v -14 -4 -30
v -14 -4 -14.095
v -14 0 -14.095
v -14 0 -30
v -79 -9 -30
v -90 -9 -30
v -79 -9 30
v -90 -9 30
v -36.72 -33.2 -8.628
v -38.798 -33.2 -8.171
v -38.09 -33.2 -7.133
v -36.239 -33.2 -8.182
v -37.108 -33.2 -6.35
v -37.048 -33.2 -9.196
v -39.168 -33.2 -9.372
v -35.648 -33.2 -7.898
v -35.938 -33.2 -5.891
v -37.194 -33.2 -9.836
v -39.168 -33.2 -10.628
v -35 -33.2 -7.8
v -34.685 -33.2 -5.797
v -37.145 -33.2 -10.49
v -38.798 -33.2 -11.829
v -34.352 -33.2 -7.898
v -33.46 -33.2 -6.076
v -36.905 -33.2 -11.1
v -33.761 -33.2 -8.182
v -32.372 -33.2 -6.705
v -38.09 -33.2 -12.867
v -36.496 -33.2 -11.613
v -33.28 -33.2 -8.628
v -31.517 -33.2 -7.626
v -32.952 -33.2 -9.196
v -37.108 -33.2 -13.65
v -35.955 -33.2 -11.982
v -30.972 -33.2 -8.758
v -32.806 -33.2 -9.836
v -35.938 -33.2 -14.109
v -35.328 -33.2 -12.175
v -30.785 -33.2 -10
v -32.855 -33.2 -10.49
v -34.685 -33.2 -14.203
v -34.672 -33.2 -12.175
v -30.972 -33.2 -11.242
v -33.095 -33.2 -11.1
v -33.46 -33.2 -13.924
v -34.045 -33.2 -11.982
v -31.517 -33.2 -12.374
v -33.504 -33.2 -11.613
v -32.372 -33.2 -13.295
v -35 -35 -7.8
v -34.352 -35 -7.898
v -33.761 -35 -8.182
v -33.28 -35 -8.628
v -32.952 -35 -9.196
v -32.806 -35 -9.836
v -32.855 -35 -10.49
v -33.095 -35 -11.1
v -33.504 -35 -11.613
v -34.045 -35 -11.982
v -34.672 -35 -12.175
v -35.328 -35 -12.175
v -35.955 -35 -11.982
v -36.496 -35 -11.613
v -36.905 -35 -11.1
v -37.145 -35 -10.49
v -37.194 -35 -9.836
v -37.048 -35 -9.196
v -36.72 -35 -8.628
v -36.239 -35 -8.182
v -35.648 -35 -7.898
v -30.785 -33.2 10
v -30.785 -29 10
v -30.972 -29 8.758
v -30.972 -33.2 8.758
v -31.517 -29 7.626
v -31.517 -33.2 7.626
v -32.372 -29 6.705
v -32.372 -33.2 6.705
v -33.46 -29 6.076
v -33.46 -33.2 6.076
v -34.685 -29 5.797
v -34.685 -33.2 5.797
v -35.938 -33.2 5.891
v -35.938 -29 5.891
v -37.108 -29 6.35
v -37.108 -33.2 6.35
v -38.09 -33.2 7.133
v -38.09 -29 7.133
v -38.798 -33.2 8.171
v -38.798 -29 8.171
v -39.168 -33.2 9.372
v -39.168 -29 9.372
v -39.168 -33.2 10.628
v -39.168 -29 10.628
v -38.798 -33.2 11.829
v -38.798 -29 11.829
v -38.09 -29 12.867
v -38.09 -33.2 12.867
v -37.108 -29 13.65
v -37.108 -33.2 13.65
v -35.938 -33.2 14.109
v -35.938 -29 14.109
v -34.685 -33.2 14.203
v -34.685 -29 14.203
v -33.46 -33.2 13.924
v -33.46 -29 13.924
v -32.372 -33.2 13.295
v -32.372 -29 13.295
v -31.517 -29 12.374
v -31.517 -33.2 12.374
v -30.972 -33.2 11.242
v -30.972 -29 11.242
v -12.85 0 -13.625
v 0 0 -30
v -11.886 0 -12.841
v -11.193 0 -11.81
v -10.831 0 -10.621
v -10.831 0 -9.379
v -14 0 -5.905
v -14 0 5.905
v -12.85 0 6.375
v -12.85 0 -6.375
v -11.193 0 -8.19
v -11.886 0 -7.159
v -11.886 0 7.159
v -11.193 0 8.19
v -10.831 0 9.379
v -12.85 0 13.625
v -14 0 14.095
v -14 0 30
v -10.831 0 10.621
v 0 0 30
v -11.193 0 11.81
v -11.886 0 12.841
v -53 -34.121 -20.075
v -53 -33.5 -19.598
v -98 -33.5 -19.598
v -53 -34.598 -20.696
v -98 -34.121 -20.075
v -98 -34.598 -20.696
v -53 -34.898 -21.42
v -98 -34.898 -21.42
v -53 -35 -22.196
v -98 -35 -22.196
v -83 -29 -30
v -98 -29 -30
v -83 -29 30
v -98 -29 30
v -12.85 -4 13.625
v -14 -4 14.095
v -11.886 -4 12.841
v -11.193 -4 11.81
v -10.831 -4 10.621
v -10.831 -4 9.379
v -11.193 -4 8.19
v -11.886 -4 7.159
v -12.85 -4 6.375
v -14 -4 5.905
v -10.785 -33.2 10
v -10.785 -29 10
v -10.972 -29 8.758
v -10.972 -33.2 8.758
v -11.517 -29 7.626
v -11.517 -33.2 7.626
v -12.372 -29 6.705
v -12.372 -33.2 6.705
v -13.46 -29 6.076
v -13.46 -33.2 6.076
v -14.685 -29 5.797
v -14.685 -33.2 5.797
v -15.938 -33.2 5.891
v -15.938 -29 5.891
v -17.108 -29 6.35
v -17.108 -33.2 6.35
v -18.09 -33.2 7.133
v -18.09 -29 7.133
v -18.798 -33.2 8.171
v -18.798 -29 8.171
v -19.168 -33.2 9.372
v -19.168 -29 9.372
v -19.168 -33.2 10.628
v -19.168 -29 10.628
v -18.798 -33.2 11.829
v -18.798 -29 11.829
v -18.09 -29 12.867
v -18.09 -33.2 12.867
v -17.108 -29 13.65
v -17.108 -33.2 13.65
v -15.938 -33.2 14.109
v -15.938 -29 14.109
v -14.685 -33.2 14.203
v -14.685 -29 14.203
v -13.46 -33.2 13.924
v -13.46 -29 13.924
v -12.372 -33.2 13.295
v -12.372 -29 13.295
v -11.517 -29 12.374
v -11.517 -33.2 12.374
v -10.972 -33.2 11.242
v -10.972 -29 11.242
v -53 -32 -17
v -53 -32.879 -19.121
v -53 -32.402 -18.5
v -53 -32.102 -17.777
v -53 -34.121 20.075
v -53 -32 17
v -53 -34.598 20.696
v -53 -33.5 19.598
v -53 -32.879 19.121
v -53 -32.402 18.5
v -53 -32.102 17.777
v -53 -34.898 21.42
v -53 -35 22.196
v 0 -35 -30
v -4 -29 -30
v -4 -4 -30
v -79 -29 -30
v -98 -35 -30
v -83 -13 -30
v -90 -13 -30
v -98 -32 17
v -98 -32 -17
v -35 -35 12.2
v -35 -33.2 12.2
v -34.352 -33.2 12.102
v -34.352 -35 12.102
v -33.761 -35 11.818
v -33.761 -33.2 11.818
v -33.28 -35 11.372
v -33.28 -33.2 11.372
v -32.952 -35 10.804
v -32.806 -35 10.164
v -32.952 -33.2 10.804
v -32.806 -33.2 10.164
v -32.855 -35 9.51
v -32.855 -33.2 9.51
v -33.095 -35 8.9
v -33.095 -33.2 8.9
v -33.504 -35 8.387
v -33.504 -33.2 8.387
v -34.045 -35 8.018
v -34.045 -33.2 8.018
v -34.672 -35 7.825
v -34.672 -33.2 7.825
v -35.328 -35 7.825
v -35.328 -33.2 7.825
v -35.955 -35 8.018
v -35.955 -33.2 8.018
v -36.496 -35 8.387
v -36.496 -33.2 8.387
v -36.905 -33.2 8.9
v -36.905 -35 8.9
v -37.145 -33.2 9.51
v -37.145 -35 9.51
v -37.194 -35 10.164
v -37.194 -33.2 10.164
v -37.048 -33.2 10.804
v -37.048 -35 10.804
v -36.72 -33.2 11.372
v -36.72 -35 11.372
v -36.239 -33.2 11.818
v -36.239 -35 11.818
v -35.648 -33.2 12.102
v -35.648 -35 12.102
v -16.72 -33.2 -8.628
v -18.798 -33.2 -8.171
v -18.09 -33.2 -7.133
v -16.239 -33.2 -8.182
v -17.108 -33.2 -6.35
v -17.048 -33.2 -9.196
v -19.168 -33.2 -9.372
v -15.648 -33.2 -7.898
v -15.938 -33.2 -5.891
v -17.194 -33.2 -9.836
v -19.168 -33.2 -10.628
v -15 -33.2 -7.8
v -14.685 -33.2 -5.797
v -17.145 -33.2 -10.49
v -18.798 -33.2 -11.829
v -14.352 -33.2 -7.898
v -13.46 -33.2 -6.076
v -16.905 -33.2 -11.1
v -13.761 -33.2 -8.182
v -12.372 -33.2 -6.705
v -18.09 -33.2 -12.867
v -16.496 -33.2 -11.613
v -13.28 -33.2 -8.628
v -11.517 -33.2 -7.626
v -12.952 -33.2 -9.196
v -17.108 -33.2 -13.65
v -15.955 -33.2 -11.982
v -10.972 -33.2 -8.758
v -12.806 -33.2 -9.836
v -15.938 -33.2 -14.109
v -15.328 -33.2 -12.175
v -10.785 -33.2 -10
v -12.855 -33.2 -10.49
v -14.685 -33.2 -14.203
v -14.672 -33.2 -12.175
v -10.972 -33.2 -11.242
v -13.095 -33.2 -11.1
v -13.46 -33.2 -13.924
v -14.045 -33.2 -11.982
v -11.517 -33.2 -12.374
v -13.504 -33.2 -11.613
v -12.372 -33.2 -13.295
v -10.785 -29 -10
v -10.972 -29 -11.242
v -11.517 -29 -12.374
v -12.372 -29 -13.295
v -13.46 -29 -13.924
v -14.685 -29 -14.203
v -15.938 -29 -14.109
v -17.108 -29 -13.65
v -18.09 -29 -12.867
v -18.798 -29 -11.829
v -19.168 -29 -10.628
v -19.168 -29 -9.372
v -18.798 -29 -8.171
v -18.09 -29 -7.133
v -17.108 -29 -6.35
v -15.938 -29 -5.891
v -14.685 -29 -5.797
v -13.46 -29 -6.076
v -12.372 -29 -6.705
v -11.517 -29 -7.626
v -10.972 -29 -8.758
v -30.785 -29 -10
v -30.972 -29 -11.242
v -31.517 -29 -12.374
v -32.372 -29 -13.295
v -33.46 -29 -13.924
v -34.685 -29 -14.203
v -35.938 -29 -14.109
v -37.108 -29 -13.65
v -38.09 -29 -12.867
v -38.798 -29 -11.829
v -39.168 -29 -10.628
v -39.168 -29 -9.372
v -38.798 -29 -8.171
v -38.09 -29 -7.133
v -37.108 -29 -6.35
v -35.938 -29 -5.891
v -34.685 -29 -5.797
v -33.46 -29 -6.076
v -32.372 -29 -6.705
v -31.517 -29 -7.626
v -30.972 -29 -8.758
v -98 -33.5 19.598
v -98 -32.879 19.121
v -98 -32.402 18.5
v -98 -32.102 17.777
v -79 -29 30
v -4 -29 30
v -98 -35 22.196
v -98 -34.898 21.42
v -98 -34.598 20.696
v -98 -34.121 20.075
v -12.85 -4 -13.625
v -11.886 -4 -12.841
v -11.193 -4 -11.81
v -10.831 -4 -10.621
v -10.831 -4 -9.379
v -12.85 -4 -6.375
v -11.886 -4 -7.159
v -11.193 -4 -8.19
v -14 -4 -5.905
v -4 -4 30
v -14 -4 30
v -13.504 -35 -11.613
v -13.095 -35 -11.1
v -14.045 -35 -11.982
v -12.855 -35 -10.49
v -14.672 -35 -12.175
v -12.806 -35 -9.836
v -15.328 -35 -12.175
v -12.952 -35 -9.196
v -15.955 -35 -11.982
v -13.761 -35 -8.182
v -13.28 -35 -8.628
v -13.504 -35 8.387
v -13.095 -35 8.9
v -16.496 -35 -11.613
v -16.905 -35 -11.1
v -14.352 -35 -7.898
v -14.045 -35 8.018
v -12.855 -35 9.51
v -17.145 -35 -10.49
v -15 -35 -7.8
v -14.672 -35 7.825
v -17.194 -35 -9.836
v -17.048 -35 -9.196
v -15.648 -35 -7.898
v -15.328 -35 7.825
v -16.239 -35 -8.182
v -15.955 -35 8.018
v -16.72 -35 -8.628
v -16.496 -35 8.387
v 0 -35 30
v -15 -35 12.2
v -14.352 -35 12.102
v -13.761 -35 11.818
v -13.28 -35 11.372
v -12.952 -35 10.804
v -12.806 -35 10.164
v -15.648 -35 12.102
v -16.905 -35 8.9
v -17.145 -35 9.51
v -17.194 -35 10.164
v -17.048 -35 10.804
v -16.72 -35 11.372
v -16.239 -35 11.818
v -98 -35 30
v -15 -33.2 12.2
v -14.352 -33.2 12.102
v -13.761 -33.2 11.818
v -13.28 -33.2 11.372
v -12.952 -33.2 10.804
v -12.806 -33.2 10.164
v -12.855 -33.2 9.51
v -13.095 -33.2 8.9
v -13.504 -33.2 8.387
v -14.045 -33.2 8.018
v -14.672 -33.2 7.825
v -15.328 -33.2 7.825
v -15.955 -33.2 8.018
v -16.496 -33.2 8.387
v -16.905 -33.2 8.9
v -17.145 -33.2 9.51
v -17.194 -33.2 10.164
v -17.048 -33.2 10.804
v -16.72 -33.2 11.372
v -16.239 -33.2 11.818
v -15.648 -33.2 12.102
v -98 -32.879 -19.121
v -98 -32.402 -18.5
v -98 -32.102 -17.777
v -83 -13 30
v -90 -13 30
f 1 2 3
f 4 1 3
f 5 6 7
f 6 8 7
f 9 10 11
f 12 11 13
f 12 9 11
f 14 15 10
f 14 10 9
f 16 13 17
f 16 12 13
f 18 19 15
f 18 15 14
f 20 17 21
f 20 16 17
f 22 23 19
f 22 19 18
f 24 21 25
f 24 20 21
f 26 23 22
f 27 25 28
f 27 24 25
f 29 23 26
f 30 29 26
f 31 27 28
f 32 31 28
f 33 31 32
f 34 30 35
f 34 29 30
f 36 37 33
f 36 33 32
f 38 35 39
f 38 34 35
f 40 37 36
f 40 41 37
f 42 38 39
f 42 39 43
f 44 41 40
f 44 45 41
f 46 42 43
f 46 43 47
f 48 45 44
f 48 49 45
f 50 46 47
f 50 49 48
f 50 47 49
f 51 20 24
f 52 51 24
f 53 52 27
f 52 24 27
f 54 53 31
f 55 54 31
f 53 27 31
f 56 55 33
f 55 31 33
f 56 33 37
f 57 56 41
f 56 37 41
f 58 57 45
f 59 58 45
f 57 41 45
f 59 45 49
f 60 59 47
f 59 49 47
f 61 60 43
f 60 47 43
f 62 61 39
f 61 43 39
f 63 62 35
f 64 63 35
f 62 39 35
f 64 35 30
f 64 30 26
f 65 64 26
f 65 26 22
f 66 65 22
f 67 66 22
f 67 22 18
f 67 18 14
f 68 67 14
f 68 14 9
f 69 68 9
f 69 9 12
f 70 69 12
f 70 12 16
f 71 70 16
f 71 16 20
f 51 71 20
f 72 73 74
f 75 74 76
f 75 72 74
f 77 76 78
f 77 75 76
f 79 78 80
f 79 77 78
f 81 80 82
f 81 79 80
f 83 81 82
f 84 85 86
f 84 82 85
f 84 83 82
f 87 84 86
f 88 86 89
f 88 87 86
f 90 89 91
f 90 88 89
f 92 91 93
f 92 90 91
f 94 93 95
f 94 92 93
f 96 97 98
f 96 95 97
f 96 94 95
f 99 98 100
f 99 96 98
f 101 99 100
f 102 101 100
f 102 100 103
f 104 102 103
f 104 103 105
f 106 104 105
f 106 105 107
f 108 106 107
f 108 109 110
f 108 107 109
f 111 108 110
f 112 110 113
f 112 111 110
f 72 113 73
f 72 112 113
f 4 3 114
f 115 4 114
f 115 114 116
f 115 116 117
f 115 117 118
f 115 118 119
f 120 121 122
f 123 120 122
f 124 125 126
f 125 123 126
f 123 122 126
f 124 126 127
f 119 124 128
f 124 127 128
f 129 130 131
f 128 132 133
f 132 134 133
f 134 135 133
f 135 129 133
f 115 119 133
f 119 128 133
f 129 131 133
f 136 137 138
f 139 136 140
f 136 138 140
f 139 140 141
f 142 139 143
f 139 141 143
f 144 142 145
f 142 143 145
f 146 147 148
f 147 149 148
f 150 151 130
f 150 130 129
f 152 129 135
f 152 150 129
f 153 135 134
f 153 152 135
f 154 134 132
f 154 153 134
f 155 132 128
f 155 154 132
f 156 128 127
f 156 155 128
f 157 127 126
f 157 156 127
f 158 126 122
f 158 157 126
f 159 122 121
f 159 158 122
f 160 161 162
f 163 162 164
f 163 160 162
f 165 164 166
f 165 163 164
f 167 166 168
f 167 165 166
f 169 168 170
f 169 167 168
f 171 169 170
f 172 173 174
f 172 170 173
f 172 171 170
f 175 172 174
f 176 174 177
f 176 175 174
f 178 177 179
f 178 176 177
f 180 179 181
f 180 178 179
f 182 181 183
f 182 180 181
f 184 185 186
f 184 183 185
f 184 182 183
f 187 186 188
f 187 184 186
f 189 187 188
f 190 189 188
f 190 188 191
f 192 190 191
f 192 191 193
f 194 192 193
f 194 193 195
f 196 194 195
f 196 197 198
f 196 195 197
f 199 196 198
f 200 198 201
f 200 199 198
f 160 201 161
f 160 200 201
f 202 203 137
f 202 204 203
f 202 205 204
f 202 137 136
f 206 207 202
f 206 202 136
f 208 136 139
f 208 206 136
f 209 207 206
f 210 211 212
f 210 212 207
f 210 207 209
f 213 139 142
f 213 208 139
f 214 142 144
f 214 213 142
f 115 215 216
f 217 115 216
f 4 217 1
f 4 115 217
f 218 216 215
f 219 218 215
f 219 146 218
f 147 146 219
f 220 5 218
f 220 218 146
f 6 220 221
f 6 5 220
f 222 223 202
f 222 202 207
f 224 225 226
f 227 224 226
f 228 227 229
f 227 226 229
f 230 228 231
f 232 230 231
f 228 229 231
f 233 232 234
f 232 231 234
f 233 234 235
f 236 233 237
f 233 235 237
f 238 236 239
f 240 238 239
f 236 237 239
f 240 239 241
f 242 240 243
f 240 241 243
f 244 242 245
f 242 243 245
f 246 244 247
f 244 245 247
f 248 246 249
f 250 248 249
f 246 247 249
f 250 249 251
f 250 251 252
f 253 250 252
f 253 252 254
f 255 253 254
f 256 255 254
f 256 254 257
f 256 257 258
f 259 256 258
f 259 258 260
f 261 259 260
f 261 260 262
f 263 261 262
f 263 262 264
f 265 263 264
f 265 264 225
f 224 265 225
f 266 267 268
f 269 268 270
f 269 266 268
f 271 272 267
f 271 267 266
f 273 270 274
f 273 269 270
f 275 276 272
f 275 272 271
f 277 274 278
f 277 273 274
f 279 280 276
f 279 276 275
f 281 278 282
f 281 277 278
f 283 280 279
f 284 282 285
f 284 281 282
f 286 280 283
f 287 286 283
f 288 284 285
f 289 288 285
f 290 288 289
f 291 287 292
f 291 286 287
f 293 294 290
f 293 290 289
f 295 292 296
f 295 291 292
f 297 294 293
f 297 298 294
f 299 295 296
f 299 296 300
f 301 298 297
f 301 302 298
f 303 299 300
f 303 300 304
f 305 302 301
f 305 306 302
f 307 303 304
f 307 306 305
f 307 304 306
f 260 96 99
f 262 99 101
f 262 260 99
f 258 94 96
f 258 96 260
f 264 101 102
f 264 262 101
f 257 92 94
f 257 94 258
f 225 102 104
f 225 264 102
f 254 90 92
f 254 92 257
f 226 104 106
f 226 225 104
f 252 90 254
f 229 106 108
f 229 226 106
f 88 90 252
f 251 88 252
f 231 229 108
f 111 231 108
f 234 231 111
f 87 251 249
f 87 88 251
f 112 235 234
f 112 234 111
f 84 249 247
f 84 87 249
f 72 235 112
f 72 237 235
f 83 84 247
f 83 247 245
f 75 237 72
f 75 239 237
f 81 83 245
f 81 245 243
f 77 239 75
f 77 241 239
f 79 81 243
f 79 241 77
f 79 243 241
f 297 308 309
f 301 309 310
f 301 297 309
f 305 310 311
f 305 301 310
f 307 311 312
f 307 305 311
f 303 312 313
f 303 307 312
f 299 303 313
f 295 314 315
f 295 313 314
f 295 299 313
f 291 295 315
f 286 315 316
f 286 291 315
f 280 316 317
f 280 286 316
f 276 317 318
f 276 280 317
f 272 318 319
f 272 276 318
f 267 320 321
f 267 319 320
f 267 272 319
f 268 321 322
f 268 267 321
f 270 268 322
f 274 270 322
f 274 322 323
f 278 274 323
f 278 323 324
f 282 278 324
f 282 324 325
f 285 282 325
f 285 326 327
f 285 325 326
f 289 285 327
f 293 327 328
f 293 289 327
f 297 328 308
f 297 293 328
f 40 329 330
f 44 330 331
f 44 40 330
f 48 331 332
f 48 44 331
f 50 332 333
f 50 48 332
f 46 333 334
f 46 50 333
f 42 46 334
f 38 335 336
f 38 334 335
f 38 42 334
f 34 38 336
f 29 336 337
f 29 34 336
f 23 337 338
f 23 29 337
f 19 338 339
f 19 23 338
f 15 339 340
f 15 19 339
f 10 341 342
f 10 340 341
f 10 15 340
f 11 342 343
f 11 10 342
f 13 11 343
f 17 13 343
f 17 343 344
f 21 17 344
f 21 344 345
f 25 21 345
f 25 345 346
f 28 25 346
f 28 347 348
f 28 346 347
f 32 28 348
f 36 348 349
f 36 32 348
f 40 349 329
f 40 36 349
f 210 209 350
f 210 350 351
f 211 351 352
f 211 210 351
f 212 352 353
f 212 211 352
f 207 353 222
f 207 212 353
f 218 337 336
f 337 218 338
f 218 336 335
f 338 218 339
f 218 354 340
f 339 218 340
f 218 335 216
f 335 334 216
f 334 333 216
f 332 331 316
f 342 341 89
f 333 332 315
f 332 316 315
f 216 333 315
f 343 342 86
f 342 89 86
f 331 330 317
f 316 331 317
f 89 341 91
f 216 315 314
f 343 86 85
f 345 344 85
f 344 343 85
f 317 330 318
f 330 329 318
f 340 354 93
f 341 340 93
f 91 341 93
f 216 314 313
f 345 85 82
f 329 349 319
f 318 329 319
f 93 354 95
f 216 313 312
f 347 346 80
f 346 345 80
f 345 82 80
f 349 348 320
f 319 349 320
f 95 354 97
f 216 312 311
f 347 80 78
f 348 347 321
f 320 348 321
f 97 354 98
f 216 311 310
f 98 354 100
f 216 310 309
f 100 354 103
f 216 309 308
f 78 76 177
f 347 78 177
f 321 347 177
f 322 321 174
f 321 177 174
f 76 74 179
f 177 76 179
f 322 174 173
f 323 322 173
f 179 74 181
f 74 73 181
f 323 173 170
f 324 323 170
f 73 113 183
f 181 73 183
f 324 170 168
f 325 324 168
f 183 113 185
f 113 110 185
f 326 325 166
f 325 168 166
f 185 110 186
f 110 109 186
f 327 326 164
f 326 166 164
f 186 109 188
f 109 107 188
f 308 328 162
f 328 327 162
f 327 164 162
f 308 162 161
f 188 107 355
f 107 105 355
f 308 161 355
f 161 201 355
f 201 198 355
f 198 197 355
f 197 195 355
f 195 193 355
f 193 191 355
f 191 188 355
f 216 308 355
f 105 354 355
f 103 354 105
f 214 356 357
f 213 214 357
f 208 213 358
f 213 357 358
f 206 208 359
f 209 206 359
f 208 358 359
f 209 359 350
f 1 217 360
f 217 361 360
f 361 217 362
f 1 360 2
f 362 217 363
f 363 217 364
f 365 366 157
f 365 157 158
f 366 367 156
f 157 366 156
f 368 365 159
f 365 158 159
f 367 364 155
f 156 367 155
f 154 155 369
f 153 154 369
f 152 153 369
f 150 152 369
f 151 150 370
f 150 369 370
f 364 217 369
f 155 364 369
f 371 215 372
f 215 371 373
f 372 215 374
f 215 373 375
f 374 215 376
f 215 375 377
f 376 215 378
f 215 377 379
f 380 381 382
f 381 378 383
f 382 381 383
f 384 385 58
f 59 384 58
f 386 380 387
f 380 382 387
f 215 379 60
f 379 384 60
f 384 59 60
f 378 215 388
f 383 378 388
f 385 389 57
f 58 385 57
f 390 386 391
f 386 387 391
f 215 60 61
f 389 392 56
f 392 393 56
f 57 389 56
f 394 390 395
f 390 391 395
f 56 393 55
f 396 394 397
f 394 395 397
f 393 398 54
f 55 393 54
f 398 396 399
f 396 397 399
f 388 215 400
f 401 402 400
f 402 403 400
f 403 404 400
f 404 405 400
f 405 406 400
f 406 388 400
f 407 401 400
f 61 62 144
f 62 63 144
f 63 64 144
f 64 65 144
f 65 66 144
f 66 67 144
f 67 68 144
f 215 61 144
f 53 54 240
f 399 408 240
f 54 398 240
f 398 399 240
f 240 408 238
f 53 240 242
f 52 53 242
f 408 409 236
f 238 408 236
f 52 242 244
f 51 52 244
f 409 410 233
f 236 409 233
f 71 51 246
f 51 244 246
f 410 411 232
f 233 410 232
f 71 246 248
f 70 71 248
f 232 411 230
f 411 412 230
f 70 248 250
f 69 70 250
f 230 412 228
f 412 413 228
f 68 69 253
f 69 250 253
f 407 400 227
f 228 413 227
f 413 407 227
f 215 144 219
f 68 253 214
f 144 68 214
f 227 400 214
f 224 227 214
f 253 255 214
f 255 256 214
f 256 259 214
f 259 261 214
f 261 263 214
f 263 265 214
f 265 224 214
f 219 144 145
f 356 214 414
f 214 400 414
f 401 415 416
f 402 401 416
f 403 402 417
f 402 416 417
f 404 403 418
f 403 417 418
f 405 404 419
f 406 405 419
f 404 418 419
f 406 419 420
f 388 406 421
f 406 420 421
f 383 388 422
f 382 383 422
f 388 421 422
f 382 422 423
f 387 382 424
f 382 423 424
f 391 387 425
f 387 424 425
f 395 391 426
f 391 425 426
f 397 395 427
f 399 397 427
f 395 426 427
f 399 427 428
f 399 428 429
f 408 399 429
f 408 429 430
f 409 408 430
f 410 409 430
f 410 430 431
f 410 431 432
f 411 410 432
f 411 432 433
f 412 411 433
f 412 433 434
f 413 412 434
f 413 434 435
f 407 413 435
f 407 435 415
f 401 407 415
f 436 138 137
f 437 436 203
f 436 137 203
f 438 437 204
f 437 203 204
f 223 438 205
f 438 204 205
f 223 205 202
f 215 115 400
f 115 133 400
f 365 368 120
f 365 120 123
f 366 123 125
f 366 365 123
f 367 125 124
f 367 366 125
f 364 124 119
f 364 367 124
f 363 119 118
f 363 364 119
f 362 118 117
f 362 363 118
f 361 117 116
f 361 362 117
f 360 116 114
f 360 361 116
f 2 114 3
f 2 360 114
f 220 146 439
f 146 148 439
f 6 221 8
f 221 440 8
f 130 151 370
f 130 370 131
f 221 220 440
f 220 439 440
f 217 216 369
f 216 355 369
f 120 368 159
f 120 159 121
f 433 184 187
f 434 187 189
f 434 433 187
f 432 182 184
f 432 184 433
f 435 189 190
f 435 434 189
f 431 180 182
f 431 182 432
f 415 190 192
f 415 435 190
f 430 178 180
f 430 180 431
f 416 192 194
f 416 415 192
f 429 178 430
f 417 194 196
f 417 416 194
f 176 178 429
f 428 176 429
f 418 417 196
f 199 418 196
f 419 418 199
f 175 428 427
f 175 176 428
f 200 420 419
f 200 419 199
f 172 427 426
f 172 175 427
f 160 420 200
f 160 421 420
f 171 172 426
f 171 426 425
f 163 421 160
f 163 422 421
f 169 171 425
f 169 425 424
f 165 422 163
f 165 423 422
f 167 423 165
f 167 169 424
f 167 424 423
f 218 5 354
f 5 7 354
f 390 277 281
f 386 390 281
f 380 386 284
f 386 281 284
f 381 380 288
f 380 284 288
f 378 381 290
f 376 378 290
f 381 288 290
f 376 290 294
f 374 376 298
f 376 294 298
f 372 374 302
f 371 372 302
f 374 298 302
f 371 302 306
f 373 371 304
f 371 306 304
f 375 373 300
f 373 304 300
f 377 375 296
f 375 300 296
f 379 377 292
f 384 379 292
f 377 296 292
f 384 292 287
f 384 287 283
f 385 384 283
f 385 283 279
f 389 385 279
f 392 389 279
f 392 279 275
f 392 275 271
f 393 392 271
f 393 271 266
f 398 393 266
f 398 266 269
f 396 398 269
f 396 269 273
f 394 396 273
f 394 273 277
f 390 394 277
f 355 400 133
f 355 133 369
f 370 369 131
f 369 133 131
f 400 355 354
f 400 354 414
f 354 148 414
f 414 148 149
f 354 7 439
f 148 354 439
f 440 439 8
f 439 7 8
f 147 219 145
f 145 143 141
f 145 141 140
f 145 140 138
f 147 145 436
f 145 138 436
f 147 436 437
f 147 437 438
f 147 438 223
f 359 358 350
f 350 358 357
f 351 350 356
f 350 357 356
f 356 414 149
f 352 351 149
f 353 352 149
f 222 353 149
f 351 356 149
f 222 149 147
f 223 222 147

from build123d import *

# Parameters (mm, degrees)
EXTRUDE_BASE_DEPTH              = 30
SKETCH2_R                       = 2.2
CUT_BOLT_HOLES_DEPTH            = 10
CUT_BOLT_HEAD_INSETS_DEPTH      = 40
CUT_BOLT_HEAD_INSETS_DEPTH_BACK = 4.2
SKETCH3_R                       = 4.215
SKETCH4_W                       = 40
SKETCH4_H                       = 3
CUT_TOP_CLEARANCE_SLOT_DEPTH    = 45
FILLET_CLEARANCE_SLOT_PT_1_R    = 3
FILLET_CLEARANCE_SLOT_PT_2_R    = 3


# Some blends are built 0.0001 mm under size
with BuildPart() as part:
    # Sketch1 → Extrude-Base (new, symmetric)
    with BuildSketch(Plane.XY):
        Polygon((-14, 0), (0, 0), (0, -35), (-98, -35), (-98, -29), (-83, -29), (-83, -13), (-90, -13), (-90, -9), (-79, -9), (-79, -29), (-4, -29), (-4, -4), (-14, -4), align=None)
    extrude(amount=EXTRUDE_BASE_DEPTH, both=True)

    # Sketch2 → Cut-Bolt Holes (cut)
    with BuildSketch(Plane(origin=(0, -29, 0), x_dir=(1, 0, 0), z_dir=(0, 1, 0))):
        with Locations(Location((-15, -10, 0), (0, 0, 270))):
            Circle(SKETCH2_R)
        with Locations(Location((-15, 10, 0), (0, 0, 270))):
            Circle(SKETCH2_R)
        with Locations(Location((-35, 10, 0), (0, 0, 270))):
            Circle(SKETCH2_R)
        with Locations(Location((-35, -10, 0), (0, 0, 270))):
            Circle(SKETCH2_R)
    extrude(amount=-CUT_BOLT_HOLES_DEPTH, mode=Mode.SUBTRACT)

    # Sketch3 → Cut-Bolt Head Insets (cut, two sides: drawn at the far end of the back side and taken through both)
    with BuildSketch(Plane(origin=(0, -29, 0), x_dir=(1, 0, 0), z_dir=(0, 1, 0)).offset(-CUT_BOLT_HEAD_INSETS_DEPTH_BACK)):
        with Locations((-35, 10)):
            Circle(SKETCH3_R)
        with Locations((-15, 10)):
            Circle(SKETCH3_R)
        with Locations((-15, -10)):
            Circle(SKETCH3_R)
        with Locations((-35, -10)):
            Circle(SKETCH3_R)
    extrude(amount=CUT_BOLT_HEAD_INSETS_DEPTH + CUT_BOLT_HEAD_INSETS_DEPTH_BACK, mode=Mode.SUBTRACT)

    # Sketch4 → Cut-Top Clearance Slot (cut)
    with BuildSketch(Plane.ZY.offset(98)):
        with Locations((0, -33.5)):
            Rectangle(SKETCH4_W, SKETCH4_H)
    extrude(amount=-CUT_TOP_CLEARANCE_SLOT_DEPTH, mode=Mode.SUBTRACT)

    # Fillet-Clearance Slot Pt 1
    fillet_clearance_slot_pt_1_edges = [part.edges().sort_by_distance(p)[0] for p in [
        (-75.5, -32, 20),
        (-75.5, -32, -20),
    ]]
    fillet(fillet_clearance_slot_pt_1_edges, radius=FILLET_CLEARANCE_SLOT_PT_1_R - 0.0001)  # a hair under: the kernel refuses the full size

    # Fillet-Clearance Slot Pt 2
    # the kernel refuses this fillet: 3 mm, written as the material it takes off along each edge
    with BuildSketch(Plane(origin=(-103.490486718, -35, 20), x_dir=(0, 0, 1), z_dir=(1, 0, 0))) as fillet_clearance_slot_pt_2_piece_1:
        with BuildLine():
            CenterArc((2.196194687, -3), FILLET_CLEARANCE_SLOT_PT_2_R, 90, 60.000551337)
            Line((-0.401895958, -1.500025), (-0.661705022, -1.3500275))
            ThreePointArc((-0.661705022, -1.3500275), (-0.3, -0.0001), (-0.3, 0))
            Line((-0.3, 0), (0, 0.3))
            Line((0, 0.3), (2.196194687, 0.3))
            Line((2.196194687, 0.3), (2.196194687, 0))
        make_face()
    extrude(amount=50.490486718, mode=Mode.SUBTRACT)
    with BuildSketch(Plane(origin=(-103.490486718, -35, -20), x_dir=(0, 0.9659313848535176, 0.25879829936644777), z_dir=(1, 0, 0))) as fillet_clearance_slot_pt_2_piece_2:
        with BuildLine():
            CenterArc((2.329422704, -2.897768274), FILLET_CLEARANCE_SLOT_PT_2_R, 105.000679234, 60.000551337)
            Line((-0.56837145, -2.121373376), (-0.858150866, -2.043733886))
            Line((-0.858150866, -2.043733886), (-0.289779415, 0.07763949))
            Line((-0.289779415, 0.07763949), (0.07763949, 0.289779415))
            ThreePointArc((0.07763949, 0.289779415), (0.077736083, 0.289753536), (1.475282068, 0.289776827))
            Line((1.475282068, 0.289776827), (1.552931216, 0))
        make_face()
    extrude(amount=50.490486718, mode=Mode.SUBTRACT)


solid = part.part
